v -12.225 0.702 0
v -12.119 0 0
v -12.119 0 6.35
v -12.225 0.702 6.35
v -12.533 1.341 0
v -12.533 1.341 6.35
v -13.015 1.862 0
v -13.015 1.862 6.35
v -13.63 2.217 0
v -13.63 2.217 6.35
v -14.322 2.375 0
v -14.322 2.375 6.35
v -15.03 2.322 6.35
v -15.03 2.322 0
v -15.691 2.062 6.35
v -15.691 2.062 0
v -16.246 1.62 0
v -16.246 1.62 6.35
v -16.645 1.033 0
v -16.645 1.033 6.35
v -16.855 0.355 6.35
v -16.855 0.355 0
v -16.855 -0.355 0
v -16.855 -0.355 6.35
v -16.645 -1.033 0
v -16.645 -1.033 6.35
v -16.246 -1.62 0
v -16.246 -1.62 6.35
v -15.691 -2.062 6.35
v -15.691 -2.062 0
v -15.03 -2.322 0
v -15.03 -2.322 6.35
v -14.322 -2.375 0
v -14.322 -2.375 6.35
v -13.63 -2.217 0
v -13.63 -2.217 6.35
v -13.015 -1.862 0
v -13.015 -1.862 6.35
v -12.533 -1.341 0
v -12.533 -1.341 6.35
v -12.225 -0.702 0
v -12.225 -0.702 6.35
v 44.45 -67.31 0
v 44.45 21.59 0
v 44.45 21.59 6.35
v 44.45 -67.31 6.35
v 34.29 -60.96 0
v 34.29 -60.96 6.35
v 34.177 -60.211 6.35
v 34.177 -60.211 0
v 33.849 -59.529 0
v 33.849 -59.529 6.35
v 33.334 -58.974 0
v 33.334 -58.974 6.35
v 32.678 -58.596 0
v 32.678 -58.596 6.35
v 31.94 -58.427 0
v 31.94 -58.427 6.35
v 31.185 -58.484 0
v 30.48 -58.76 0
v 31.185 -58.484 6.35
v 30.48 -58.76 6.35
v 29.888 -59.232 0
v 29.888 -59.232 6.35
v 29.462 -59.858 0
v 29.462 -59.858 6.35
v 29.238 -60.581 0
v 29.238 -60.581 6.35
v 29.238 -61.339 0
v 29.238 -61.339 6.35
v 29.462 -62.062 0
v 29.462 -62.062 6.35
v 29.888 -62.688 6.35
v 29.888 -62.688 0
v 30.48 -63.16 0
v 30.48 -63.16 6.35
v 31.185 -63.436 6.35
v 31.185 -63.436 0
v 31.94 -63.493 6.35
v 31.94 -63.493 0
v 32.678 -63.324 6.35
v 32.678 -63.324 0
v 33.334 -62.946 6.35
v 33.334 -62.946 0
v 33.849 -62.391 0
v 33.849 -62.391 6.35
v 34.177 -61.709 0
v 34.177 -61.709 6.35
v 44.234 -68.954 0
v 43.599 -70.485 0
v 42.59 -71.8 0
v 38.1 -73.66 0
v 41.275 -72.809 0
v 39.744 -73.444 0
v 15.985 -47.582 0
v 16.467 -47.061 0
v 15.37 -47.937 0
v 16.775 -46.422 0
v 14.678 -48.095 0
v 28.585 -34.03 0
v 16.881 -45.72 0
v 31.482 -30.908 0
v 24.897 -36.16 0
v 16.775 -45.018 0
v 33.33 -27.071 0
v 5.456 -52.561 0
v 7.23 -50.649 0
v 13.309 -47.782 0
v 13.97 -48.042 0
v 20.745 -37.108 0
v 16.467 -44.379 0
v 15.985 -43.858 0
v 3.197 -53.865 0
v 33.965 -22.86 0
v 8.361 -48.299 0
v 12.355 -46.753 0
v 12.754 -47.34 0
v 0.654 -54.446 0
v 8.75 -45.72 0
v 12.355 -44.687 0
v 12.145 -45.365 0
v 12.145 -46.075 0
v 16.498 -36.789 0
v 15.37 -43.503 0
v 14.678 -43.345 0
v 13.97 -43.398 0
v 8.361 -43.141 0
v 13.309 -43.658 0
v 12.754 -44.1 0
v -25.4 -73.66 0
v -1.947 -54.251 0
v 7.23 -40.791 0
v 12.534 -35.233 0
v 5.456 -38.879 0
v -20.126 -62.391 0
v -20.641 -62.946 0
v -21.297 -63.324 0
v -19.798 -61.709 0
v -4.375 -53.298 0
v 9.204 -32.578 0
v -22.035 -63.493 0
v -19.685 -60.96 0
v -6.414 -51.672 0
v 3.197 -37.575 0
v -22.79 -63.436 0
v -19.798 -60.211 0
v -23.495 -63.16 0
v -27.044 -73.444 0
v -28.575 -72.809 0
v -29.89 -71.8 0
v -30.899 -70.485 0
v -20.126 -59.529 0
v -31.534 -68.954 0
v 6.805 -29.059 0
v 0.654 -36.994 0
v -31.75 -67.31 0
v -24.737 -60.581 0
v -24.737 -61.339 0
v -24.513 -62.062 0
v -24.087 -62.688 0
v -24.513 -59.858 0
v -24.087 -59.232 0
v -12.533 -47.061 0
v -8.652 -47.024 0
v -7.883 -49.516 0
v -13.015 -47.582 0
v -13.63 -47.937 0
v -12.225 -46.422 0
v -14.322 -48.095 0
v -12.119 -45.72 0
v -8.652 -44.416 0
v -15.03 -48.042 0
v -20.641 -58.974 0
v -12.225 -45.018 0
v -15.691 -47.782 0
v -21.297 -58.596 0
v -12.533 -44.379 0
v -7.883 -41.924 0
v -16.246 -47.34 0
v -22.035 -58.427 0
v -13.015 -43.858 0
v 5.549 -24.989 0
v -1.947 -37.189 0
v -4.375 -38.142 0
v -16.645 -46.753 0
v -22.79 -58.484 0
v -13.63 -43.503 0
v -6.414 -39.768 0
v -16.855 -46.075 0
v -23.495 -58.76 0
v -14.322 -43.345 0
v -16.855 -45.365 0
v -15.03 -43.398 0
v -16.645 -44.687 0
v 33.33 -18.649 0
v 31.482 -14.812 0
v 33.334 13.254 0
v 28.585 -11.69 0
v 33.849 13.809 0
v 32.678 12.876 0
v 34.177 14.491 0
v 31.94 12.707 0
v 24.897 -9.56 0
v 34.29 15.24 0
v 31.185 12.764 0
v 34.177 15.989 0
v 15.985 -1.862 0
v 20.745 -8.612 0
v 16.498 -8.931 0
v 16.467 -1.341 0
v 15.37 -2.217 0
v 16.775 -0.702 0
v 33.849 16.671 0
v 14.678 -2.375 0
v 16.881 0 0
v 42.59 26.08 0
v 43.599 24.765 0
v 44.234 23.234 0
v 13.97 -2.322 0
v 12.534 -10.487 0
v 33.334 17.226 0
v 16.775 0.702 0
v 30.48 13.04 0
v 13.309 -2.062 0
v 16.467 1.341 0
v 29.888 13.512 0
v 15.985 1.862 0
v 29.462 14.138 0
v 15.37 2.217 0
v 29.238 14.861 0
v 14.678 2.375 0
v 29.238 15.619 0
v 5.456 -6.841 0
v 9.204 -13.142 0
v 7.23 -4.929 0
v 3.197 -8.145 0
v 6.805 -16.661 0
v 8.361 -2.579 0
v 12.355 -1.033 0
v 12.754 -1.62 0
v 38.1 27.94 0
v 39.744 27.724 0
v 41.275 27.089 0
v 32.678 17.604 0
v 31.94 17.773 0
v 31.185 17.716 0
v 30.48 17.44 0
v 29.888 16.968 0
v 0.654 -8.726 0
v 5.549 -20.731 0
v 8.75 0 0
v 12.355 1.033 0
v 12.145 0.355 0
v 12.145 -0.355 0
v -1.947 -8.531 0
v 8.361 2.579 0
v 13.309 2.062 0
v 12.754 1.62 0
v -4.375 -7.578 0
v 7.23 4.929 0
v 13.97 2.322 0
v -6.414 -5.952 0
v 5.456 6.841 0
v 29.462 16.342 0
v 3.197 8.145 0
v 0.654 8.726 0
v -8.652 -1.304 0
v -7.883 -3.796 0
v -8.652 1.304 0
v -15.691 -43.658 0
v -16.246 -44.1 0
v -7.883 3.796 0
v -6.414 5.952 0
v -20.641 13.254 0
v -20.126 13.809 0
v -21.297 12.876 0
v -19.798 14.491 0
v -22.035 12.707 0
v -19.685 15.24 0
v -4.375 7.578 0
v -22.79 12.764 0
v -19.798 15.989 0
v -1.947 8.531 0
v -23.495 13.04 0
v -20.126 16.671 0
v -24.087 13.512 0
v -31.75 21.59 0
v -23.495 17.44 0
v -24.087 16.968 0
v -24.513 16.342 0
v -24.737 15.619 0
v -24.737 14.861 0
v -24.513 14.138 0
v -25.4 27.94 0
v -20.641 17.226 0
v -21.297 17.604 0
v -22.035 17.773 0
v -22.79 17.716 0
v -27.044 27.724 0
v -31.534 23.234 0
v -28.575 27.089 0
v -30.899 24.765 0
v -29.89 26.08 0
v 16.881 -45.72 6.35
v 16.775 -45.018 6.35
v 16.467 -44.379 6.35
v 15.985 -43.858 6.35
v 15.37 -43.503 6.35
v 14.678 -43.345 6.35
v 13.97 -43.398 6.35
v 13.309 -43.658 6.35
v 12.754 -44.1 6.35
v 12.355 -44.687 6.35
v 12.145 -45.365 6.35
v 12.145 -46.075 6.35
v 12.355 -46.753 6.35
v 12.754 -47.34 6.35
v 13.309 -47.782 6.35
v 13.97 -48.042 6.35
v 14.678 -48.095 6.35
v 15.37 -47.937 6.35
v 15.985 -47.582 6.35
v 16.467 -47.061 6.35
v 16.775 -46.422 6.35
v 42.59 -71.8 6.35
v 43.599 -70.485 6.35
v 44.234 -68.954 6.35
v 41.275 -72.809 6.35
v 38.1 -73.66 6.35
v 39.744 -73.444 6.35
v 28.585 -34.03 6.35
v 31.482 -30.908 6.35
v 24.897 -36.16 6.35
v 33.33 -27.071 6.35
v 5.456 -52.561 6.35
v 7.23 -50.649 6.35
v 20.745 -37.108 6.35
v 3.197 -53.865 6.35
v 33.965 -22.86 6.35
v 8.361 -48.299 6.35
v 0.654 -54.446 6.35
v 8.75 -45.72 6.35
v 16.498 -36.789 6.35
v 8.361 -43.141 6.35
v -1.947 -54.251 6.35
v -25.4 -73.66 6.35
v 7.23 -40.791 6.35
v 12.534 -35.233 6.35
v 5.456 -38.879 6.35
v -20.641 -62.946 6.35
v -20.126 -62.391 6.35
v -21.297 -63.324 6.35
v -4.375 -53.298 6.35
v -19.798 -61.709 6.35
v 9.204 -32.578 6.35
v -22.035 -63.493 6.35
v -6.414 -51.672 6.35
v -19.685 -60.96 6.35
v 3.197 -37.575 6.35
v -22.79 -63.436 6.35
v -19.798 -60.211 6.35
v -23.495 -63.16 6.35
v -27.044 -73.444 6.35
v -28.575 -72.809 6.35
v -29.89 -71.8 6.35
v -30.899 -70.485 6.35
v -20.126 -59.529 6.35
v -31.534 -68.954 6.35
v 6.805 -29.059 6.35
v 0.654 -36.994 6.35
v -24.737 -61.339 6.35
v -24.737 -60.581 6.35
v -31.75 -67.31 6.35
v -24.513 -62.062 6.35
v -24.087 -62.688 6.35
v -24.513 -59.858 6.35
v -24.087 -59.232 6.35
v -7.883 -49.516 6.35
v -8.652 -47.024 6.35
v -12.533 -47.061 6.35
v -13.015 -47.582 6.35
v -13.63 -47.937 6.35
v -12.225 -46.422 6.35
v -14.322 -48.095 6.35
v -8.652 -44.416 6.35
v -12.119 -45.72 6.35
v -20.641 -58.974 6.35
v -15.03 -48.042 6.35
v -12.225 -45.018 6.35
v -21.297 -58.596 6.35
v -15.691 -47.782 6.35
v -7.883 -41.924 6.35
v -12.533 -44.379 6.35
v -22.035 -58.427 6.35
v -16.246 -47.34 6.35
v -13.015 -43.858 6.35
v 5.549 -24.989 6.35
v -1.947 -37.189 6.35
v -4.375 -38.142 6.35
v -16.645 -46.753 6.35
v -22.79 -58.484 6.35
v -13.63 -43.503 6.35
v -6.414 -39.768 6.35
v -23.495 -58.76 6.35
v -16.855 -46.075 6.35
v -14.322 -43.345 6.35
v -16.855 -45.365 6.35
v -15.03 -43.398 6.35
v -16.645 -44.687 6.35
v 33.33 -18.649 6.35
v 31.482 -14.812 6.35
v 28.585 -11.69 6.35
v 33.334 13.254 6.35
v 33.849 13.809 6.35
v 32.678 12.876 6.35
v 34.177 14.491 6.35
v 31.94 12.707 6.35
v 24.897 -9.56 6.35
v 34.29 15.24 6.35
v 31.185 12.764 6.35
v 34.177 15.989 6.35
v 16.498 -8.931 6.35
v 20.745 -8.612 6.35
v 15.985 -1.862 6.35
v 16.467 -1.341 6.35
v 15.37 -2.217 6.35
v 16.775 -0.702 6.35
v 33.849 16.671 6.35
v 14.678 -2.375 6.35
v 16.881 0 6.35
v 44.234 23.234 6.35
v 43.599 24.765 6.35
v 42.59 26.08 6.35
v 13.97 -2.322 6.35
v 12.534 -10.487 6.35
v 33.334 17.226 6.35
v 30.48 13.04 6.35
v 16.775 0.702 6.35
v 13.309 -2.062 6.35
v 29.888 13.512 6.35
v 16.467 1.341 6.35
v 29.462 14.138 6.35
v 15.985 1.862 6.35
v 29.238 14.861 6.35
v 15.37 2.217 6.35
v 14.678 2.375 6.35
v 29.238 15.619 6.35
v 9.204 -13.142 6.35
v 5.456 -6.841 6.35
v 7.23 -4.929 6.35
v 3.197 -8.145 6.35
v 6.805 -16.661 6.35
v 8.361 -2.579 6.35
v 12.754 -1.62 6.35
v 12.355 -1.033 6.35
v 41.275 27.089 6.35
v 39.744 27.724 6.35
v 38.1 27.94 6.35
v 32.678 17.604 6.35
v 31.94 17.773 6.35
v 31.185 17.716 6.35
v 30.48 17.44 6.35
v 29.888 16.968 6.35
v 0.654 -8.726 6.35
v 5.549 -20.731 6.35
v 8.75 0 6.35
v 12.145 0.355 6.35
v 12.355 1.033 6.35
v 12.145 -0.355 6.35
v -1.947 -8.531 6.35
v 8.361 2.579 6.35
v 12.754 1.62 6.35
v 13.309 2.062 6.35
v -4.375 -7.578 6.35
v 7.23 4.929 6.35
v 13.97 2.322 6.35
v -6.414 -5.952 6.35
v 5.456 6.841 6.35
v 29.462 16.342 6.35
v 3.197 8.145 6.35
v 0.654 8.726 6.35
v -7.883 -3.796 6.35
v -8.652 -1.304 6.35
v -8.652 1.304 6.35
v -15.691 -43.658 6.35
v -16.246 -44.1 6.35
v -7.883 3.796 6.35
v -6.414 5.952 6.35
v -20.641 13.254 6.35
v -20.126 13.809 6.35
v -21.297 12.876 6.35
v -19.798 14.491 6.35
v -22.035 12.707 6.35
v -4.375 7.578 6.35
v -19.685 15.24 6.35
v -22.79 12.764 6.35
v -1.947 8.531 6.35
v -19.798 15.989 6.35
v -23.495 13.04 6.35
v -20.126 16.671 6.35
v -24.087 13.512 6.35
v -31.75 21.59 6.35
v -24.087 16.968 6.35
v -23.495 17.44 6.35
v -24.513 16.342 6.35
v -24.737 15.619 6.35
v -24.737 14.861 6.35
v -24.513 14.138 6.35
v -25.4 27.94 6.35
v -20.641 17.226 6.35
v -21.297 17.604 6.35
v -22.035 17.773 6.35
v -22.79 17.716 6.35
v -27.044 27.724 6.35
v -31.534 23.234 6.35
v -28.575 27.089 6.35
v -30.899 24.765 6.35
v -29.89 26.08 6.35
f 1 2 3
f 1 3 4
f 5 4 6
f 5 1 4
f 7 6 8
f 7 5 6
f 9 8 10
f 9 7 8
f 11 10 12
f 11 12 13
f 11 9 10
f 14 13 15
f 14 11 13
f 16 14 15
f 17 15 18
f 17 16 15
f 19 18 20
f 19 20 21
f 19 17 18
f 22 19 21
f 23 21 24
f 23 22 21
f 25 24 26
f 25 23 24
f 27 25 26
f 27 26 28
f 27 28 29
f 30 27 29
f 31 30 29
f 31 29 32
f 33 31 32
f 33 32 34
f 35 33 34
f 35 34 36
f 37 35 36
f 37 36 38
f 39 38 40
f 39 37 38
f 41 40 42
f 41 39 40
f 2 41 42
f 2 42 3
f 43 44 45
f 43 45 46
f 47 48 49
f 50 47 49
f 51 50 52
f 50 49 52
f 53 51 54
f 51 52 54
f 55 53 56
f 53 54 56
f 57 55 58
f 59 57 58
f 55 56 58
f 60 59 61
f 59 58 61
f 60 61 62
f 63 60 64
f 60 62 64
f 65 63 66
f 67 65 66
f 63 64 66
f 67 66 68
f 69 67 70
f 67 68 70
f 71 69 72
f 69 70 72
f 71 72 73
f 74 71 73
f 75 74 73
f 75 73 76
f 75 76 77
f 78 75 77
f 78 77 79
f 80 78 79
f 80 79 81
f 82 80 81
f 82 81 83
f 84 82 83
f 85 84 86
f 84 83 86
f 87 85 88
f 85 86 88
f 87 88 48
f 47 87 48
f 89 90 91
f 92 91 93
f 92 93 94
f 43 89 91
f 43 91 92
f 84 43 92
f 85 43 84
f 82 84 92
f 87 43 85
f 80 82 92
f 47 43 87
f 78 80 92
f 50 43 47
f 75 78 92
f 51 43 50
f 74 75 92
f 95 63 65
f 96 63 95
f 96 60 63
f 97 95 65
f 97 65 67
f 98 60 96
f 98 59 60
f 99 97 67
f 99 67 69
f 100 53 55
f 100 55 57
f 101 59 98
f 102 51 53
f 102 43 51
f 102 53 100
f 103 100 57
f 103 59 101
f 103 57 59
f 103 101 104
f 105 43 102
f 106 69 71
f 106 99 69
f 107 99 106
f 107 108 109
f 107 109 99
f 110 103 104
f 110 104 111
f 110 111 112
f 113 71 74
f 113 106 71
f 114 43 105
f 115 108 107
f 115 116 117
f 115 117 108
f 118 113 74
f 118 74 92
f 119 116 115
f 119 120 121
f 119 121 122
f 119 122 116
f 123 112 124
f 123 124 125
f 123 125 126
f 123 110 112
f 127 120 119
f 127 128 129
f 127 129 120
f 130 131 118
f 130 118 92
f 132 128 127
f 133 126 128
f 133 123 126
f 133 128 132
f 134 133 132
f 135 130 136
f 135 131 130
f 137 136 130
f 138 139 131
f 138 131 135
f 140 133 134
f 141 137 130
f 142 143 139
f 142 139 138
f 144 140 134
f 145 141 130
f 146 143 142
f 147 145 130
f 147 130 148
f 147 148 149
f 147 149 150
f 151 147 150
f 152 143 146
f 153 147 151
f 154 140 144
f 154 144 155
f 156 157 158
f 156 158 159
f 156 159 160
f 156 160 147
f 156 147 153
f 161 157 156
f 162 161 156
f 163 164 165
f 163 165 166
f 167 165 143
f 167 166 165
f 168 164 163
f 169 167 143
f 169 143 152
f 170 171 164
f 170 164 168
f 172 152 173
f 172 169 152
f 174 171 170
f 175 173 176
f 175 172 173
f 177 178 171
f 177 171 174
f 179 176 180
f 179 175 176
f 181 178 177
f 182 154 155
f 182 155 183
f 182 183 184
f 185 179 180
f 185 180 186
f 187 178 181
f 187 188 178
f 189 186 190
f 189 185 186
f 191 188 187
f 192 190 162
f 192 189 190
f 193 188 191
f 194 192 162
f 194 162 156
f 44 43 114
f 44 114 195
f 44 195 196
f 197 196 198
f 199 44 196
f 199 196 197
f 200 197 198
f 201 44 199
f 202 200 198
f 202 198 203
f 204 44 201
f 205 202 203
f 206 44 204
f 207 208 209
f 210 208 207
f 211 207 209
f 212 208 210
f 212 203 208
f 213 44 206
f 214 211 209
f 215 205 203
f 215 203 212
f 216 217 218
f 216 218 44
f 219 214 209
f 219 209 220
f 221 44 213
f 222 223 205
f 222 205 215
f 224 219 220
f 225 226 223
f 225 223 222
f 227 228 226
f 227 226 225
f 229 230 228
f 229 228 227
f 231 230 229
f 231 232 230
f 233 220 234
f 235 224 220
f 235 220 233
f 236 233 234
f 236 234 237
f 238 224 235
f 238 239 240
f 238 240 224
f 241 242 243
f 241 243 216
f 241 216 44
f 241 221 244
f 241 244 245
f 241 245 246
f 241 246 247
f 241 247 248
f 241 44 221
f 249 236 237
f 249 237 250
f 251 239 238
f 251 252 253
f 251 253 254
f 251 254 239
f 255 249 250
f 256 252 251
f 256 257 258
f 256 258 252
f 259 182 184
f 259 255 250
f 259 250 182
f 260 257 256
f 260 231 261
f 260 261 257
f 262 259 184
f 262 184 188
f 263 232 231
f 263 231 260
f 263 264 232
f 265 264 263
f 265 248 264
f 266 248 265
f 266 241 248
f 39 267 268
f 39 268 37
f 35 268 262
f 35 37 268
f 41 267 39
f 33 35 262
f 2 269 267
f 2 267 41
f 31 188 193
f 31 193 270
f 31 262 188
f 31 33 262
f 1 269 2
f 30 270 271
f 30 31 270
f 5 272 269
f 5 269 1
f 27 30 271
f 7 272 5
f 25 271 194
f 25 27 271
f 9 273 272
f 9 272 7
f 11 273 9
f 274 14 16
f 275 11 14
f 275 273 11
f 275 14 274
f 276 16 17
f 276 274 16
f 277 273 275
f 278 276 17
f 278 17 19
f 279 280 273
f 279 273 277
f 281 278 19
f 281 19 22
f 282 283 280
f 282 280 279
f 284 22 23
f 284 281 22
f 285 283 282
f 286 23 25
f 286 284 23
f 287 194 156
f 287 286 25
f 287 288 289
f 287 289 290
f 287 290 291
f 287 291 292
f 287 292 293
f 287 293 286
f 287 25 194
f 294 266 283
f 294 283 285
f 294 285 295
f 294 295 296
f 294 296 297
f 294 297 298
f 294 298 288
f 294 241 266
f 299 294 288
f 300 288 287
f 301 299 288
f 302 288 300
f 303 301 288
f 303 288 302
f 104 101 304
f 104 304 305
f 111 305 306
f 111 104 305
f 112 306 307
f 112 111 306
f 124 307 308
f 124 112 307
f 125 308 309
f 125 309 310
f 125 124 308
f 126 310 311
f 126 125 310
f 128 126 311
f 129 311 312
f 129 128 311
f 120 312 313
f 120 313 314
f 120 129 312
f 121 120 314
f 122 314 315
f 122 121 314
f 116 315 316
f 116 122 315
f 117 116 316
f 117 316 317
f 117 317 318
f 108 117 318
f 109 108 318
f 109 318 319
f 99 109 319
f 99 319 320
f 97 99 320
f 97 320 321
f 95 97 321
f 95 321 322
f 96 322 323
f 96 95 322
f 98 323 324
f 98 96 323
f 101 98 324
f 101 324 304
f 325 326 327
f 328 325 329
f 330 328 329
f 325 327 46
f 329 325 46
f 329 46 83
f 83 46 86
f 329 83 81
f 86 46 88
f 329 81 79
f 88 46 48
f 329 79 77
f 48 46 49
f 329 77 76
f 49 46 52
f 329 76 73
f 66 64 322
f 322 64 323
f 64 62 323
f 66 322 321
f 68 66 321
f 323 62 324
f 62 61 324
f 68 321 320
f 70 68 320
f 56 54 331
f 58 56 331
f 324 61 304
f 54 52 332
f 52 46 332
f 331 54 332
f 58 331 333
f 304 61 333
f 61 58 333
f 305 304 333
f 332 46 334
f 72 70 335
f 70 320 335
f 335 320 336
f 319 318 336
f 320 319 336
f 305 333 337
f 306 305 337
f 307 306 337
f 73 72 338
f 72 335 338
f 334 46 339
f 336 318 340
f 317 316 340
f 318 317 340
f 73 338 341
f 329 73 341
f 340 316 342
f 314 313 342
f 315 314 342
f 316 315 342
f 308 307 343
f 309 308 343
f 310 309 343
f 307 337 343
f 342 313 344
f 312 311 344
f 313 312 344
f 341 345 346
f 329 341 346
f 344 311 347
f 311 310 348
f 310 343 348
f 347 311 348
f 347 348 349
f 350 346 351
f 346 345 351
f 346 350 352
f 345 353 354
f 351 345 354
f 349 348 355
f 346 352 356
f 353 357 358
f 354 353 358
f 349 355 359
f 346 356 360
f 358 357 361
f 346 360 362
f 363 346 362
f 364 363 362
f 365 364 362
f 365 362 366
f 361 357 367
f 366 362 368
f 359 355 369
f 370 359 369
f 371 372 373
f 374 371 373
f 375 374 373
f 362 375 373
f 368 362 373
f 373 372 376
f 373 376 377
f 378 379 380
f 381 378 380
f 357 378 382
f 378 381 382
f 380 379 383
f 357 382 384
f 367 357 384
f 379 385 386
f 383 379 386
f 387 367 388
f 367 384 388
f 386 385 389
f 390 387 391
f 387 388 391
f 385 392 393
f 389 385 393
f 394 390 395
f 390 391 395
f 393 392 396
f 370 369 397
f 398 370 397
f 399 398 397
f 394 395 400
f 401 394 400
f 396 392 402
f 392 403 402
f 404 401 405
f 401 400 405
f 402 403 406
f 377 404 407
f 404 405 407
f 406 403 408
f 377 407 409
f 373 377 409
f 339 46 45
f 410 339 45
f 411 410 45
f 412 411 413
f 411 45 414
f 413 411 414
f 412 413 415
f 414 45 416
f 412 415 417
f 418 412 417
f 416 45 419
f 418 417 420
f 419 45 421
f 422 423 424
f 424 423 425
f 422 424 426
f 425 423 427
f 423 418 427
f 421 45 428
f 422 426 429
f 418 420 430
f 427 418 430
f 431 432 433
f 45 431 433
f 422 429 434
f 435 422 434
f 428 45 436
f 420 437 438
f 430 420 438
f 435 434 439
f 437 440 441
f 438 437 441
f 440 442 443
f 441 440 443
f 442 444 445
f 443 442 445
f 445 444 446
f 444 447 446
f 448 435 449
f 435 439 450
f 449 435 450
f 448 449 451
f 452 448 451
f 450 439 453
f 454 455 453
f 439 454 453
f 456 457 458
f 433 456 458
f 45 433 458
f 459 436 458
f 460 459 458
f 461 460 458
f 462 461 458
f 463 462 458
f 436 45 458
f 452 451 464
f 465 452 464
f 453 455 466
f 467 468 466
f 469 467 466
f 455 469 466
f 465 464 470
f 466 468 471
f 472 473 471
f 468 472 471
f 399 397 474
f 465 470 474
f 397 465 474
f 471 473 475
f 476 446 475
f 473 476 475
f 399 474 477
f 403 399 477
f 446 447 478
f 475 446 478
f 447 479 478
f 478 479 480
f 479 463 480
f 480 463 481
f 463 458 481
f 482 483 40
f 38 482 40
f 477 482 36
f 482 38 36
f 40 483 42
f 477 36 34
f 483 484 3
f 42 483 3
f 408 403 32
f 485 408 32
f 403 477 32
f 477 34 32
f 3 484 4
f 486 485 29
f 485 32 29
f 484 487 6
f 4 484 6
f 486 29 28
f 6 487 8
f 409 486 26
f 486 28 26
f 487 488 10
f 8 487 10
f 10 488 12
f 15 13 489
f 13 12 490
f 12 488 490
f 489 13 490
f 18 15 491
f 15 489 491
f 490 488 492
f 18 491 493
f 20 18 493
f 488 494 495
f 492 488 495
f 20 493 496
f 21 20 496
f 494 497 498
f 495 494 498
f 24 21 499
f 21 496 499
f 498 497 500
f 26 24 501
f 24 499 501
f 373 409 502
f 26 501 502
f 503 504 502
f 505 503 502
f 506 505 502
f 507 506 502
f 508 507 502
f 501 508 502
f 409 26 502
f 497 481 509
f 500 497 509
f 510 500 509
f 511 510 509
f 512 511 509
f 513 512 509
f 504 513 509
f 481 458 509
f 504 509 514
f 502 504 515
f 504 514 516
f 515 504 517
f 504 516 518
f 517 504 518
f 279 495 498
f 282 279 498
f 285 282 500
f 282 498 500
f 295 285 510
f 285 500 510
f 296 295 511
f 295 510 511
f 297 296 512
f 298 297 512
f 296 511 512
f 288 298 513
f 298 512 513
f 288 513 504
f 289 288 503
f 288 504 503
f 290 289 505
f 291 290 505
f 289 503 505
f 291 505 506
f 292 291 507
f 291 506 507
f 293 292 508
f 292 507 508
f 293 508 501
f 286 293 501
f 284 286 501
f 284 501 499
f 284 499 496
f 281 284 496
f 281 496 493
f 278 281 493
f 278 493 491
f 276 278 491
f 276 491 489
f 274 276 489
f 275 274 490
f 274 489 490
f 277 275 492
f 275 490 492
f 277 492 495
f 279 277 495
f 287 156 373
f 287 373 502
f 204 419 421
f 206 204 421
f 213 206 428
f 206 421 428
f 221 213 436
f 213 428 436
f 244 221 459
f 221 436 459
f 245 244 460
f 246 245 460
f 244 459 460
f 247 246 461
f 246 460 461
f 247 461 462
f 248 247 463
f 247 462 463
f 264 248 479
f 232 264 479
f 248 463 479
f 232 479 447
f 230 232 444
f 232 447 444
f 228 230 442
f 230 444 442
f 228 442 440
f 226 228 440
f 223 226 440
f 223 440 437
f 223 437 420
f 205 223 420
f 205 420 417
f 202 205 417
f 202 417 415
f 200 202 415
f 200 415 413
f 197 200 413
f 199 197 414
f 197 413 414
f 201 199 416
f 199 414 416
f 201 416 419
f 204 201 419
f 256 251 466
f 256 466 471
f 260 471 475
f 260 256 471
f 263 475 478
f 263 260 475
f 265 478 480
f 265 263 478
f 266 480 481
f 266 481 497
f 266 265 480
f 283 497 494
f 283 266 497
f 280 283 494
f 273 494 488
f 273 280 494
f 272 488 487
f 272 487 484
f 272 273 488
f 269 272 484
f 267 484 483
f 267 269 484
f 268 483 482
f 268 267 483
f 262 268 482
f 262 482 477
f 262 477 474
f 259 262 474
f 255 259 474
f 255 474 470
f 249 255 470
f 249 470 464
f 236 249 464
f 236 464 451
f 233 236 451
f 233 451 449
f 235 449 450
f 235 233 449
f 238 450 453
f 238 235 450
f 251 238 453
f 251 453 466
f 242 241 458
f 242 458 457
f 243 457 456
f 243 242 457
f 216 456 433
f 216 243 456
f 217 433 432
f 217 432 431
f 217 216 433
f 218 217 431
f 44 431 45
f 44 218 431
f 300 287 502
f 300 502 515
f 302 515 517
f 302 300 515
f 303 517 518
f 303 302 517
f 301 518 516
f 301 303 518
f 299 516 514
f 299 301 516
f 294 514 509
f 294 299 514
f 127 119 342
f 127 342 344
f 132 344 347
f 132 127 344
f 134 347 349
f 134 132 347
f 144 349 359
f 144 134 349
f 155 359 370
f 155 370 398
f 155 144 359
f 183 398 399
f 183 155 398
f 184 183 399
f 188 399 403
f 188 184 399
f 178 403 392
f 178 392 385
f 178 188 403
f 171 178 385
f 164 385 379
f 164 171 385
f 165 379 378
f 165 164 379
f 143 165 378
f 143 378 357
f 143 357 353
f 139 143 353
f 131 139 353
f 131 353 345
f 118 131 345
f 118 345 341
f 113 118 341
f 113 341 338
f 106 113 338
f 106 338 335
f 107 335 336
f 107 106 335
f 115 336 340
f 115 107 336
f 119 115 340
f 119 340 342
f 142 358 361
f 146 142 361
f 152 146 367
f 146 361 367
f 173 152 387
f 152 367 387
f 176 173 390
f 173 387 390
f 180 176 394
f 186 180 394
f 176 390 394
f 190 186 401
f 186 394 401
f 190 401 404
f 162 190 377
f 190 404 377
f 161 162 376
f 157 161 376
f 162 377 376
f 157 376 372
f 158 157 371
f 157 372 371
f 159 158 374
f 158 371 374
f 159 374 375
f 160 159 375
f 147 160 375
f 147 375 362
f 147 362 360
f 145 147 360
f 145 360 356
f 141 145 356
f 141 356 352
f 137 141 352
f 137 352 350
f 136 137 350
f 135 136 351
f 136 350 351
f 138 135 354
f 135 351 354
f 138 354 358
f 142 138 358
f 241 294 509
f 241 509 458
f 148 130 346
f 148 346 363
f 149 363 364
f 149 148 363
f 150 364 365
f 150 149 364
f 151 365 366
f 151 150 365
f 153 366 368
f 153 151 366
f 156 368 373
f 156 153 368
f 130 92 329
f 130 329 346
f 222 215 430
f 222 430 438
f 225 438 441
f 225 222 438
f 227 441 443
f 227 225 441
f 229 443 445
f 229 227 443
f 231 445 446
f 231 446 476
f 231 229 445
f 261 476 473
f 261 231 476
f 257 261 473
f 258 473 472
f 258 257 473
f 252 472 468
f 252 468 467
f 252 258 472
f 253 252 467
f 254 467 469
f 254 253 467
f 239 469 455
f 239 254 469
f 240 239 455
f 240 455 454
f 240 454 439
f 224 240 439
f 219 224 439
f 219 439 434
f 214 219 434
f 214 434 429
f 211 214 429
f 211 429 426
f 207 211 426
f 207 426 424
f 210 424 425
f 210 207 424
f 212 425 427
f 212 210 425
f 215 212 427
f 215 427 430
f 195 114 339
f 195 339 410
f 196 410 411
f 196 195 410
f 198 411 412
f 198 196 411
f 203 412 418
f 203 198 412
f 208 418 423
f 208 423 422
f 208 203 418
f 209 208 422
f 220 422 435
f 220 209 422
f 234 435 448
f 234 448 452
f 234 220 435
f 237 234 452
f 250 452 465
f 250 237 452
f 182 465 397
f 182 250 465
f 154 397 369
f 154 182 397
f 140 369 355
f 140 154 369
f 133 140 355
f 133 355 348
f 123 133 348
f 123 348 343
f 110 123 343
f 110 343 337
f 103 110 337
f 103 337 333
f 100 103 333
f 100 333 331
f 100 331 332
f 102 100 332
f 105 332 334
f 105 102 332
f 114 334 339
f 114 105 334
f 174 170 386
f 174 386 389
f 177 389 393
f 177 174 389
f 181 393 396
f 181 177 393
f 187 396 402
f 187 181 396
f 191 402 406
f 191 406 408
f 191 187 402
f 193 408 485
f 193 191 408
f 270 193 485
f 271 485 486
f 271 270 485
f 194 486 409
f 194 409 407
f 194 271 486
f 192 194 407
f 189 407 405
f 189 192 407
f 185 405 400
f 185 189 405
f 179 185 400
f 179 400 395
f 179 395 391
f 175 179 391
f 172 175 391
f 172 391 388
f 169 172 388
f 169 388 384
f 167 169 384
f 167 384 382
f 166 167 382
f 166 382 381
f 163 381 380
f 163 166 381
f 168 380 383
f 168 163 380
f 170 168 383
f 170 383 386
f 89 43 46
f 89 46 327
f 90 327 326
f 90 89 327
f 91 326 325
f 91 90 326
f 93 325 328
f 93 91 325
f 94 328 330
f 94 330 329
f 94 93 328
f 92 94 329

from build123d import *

# Parameters (mm, degrees)
SKETCH1_R           = 2.38125
SKETCH1_R_2         = 14.2875
SKETCH1_R_3         = 8.75
BOSS_EXTRUDE1_DEPTH = 6.35
SKETCH2_R           = 2.54
CUT_EXTRUDE1_DEPTH  = 6.35


with BuildPart() as part:
    # Sketch1 → Boss-Extrude1 (new body)
    with BuildSketch(Plane.XY):
        with BuildLine():
            Line((-25.4, 27.94), (38.1, 27.94))
            ThreePointArc((38.1, 27.94), (42.590128061, 26.080128061), (44.45, 21.59))
            Line((44.45, 21.59), (44.45, -67.31))
            ThreePointArc((44.45, -67.31), (42.590128061, -71.800128061), (38.1, -73.66))
            Line((38.1, -73.66), (-25.4, -73.66))
            ThreePointArc((-25.4, -73.66), (-29.890128061, -71.800128061), (-31.75, -67.31))
            Line((-31.75, -67.31), (-31.75, 21.59))
            ThreePointArc((-31.75, 21.59), (-29.890128061, 26.080128061), (-25.4, 27.94))
        make_face()
        with Locations((14.5, 0)):
            Circle(SKETCH1_R, mode=Mode.SUBTRACT)
        with Locations((-14.5, 0)):
            Circle(SKETCH1_R, mode=Mode.SUBTRACT)
        with Locations((14.5, -45.72)):
            Circle(SKETCH1_R, mode=Mode.SUBTRACT)
        with Locations((-14.5, -45.72)):
            Circle(SKETCH1_R, mode=Mode.SUBTRACT)
        with Locations((19.677317049, -22.86)):
            Circle(SKETCH1_R_2, mode=Mode.SUBTRACT)
        with Locations((0, -45.72)):
            Circle(SKETCH1_R_3, mode=Mode.SUBTRACT)
        Circle(SKETCH1_R_3, mode=Mode.SUBTRACT)
    extrude(amount=BOSS_EXTRUDE1_DEPTH)

    # Sketch2 → Cut-Extrude1 (cut)
    with BuildSketch(Plane.XY.offset(6.35)):
        with Locations((-22.225, 15.24)):
            Circle(SKETCH2_R)
        with Locations((31.75, 15.24)):
            Circle(SKETCH2_R)
        with Locations((31.75, -60.96)):
            Circle(SKETCH2_R)
        with Locations((-22.225, -60.96)):
            Circle(SKETCH2_R)
    extrude(amount=-CUT_EXTRUDE1_DEPTH, mode=Mode.SUBTRACT)


solid = part.part
